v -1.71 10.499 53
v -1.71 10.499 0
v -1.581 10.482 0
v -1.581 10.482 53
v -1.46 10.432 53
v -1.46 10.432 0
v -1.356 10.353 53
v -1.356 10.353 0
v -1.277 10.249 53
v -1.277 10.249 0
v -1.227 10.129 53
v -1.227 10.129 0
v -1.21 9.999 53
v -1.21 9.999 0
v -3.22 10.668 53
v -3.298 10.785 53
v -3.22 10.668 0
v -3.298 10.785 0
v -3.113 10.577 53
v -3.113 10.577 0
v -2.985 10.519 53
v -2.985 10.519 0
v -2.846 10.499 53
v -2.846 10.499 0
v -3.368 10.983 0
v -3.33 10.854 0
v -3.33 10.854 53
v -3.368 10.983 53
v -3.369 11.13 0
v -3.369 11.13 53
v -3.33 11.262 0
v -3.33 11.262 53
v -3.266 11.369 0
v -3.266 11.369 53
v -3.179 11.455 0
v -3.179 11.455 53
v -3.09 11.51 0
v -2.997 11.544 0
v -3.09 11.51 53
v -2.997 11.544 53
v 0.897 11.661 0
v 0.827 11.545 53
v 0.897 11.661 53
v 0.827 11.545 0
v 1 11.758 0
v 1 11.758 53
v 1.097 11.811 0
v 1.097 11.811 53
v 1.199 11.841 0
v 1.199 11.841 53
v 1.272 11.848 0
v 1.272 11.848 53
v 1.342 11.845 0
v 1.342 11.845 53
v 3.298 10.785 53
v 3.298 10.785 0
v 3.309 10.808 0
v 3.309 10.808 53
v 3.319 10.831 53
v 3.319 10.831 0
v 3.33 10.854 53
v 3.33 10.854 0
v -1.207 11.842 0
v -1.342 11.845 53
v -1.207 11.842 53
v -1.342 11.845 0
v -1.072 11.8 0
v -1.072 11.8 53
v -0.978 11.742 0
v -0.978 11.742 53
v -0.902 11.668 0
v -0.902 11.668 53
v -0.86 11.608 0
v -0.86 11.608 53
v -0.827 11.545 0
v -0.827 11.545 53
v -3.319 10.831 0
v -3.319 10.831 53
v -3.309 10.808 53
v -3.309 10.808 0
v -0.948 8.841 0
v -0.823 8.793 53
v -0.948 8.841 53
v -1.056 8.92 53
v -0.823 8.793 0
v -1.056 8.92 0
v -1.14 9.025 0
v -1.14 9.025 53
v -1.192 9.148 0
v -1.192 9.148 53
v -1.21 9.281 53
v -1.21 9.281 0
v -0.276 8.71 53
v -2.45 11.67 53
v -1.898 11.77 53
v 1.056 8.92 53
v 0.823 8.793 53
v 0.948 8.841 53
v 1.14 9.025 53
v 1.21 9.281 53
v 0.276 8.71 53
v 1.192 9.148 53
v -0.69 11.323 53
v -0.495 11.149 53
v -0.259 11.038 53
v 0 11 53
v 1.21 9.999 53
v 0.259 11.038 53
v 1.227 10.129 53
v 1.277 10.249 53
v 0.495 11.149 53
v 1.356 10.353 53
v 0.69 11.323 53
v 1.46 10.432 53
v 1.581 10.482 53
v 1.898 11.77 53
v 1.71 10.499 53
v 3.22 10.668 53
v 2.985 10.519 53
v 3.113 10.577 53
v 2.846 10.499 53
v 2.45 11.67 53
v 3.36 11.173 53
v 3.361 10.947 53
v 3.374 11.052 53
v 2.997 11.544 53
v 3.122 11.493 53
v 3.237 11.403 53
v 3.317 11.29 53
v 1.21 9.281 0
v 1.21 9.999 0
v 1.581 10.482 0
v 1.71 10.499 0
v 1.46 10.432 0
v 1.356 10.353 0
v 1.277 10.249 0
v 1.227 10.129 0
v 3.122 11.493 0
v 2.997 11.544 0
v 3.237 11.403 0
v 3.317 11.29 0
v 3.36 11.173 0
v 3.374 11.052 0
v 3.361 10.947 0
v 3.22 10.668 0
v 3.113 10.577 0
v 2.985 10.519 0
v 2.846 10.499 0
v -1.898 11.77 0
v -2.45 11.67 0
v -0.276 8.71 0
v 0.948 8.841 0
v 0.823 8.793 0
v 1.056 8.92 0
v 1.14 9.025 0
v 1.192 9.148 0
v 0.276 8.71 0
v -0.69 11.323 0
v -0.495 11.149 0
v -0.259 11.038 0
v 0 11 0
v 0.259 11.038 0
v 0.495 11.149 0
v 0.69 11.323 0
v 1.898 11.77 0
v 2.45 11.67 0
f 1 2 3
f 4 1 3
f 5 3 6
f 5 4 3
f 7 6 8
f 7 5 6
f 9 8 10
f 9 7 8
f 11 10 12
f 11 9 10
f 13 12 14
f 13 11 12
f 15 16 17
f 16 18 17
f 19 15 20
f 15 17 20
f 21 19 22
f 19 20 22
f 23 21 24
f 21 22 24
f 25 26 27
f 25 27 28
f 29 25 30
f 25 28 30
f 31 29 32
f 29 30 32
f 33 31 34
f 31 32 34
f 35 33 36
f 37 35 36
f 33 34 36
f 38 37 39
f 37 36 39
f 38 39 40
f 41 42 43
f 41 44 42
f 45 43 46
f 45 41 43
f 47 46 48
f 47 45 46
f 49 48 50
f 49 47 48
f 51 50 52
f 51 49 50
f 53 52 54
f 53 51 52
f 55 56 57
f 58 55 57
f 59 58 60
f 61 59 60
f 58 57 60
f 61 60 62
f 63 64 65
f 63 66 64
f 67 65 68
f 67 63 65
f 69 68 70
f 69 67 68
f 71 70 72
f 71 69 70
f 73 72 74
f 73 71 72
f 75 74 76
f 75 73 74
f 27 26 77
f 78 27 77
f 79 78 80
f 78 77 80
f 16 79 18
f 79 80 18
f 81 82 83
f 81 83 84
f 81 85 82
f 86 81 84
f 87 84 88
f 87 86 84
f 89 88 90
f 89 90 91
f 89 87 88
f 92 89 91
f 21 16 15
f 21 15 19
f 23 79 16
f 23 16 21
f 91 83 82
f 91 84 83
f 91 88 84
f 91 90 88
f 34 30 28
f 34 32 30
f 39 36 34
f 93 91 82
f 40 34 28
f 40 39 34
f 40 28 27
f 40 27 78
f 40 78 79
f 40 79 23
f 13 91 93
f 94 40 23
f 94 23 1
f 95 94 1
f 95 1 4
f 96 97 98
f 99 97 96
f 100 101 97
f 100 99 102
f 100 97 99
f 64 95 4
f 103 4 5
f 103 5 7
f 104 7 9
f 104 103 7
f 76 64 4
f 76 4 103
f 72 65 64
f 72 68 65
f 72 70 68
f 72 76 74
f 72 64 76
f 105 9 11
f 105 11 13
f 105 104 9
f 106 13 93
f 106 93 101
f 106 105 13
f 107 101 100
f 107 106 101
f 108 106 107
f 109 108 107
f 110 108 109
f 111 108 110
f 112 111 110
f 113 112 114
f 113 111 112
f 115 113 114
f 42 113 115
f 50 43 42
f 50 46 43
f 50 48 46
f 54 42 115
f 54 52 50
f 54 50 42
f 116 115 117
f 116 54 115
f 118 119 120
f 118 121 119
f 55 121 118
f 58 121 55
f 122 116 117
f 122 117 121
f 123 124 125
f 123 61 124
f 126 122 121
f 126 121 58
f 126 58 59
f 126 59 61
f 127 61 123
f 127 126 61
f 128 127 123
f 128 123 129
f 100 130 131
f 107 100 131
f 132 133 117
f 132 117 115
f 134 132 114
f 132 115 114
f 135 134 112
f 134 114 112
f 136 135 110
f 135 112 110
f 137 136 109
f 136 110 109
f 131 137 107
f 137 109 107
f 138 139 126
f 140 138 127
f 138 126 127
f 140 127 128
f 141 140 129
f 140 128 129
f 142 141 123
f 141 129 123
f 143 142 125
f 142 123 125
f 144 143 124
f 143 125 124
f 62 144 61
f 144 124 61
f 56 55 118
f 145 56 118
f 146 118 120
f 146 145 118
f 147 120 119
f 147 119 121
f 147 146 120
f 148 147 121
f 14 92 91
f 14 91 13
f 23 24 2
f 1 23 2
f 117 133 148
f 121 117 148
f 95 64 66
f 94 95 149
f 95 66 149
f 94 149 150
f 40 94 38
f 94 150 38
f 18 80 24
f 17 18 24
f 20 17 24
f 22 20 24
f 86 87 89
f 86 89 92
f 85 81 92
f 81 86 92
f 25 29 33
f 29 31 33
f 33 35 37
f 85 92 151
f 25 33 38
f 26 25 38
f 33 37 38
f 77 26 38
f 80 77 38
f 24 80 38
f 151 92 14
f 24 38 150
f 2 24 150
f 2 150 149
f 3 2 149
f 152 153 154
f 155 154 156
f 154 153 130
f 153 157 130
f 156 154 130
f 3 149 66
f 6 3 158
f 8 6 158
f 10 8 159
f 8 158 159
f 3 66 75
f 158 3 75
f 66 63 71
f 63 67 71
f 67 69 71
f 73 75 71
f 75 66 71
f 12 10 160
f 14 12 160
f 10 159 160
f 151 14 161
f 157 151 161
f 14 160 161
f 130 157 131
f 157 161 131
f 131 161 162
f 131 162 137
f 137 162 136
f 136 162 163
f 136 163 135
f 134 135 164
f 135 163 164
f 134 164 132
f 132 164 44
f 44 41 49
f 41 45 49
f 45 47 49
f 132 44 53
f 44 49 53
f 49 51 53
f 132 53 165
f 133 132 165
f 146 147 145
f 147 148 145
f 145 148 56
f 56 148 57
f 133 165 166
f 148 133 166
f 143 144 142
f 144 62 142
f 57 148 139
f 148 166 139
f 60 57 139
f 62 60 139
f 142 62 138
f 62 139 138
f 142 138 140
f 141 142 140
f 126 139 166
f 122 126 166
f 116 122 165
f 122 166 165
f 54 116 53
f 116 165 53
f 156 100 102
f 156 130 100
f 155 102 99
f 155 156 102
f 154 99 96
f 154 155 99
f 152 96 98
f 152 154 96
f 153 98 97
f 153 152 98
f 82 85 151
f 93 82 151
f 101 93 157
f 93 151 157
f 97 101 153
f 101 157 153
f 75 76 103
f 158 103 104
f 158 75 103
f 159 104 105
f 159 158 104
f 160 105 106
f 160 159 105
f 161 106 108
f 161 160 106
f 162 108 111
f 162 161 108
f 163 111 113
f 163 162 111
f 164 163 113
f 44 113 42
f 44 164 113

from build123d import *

# Parameters (mm, degrees)
BOX007_W          = 2.42
BOX007_H          = 1.69
BOX007_DEPTH      = 55
BOX008_W          = 2.42
BOX008_H          = 1.69
BOX008_DEPTH      = 55
CYLINDER002_R     = 0.9
CYLINDER002_DEPTH = 55
EXTRUDE011_DEPTH  = 53
FILLET_R          = 0.5


with BuildPart() as cubo_izq001:
    # Box007 → Box007 (new body)
    with BuildSketch(Plane(origin=(-3.63, 8.809483, 0), x_dir=(1, 0, 0), z_dir=(0, 0, 1))):
        with Locations((1.21, 0.845)):
            Rectangle(BOX007_W, BOX007_H)
    extrude(amount=BOX007_DEPTH)


with BuildPart() as cubo_der001:
    # Box008 → Box008 (new body)
    with BuildSketch(Plane(origin=(1.21, 8.809483, 0), x_dir=(1, 0, 0), z_dir=(0, 0, 1))):
        with Locations((1.21, 0.845)):
            Rectangle(BOX008_W, BOX008_H)
    extrude(amount=BOX008_DEPTH)


with BuildPart() as cilindro001:
    # Cylinder002 → Cylinder002 (new body)
    with BuildSketch(Plane(origin=(0, 11.9, 0), x_dir=(1, 0, 0), z_dir=(0, 0, 1))):
        Circle(CYLINDER002_R)
    extrude(amount=CYLINDER002_DEPTH)


with BuildPart() as barrote_definitivo_fina_parte_grande:
    # Sketch011 → Extrude011 (new body)
    with BuildSketch(Plane(origin=(0, -0.2, 0), x_dir=(1, 0, 0), z_dir=(0, 0, 1))):
        with BuildLine():
            ThreePointArc((-3.52341, 11.59655), (0, 8.899483), (3.52341, 11.59655))
            ThreePointArc((3.52341, 11.59655), (0, 12.12), (-3.52341, 11.59655))
        make_face()
    extrude(amount=EXTRUDE011_DEPTH)

    # Cut007: cut Cilindro001
    add(cilindro001.part, mode=Mode.SUBTRACT)

    # Cut008: cut Cubo der001
    add(cubo_der001.part, mode=Mode.SUBTRACT)

    # Cut009: cut Cubo izq001
    add(cubo_izq001.part, mode=Mode.SUBTRACT)

    # Fillet
    fillet_edges = [barrote_definitivo_fina_parte_grande.edges().sort_by_distance(p)[0] for p in [
        (-3.146427, 10.499483, 26.5),
        (-3.52341, 11.39655, 26.5),
        (-1.21, 10.499483, 26.5),
        (-0.899899, 11.886545, 26.5),
        (0.899899, 11.886545, 26.5),
        (3.52341, 11.39655, 26.5),
        (3.146427, 10.499483, 26.5),
        (1.21, 10.499483, 26.5),
        (1.21, 8.90588, 26.5),
        (-1.21, 8.90588, 26.5),
    ]]
    fillet(fillet_edges, radius=FILLET_R)


solid = barrote_definitivo_fina_parte_grande.part
